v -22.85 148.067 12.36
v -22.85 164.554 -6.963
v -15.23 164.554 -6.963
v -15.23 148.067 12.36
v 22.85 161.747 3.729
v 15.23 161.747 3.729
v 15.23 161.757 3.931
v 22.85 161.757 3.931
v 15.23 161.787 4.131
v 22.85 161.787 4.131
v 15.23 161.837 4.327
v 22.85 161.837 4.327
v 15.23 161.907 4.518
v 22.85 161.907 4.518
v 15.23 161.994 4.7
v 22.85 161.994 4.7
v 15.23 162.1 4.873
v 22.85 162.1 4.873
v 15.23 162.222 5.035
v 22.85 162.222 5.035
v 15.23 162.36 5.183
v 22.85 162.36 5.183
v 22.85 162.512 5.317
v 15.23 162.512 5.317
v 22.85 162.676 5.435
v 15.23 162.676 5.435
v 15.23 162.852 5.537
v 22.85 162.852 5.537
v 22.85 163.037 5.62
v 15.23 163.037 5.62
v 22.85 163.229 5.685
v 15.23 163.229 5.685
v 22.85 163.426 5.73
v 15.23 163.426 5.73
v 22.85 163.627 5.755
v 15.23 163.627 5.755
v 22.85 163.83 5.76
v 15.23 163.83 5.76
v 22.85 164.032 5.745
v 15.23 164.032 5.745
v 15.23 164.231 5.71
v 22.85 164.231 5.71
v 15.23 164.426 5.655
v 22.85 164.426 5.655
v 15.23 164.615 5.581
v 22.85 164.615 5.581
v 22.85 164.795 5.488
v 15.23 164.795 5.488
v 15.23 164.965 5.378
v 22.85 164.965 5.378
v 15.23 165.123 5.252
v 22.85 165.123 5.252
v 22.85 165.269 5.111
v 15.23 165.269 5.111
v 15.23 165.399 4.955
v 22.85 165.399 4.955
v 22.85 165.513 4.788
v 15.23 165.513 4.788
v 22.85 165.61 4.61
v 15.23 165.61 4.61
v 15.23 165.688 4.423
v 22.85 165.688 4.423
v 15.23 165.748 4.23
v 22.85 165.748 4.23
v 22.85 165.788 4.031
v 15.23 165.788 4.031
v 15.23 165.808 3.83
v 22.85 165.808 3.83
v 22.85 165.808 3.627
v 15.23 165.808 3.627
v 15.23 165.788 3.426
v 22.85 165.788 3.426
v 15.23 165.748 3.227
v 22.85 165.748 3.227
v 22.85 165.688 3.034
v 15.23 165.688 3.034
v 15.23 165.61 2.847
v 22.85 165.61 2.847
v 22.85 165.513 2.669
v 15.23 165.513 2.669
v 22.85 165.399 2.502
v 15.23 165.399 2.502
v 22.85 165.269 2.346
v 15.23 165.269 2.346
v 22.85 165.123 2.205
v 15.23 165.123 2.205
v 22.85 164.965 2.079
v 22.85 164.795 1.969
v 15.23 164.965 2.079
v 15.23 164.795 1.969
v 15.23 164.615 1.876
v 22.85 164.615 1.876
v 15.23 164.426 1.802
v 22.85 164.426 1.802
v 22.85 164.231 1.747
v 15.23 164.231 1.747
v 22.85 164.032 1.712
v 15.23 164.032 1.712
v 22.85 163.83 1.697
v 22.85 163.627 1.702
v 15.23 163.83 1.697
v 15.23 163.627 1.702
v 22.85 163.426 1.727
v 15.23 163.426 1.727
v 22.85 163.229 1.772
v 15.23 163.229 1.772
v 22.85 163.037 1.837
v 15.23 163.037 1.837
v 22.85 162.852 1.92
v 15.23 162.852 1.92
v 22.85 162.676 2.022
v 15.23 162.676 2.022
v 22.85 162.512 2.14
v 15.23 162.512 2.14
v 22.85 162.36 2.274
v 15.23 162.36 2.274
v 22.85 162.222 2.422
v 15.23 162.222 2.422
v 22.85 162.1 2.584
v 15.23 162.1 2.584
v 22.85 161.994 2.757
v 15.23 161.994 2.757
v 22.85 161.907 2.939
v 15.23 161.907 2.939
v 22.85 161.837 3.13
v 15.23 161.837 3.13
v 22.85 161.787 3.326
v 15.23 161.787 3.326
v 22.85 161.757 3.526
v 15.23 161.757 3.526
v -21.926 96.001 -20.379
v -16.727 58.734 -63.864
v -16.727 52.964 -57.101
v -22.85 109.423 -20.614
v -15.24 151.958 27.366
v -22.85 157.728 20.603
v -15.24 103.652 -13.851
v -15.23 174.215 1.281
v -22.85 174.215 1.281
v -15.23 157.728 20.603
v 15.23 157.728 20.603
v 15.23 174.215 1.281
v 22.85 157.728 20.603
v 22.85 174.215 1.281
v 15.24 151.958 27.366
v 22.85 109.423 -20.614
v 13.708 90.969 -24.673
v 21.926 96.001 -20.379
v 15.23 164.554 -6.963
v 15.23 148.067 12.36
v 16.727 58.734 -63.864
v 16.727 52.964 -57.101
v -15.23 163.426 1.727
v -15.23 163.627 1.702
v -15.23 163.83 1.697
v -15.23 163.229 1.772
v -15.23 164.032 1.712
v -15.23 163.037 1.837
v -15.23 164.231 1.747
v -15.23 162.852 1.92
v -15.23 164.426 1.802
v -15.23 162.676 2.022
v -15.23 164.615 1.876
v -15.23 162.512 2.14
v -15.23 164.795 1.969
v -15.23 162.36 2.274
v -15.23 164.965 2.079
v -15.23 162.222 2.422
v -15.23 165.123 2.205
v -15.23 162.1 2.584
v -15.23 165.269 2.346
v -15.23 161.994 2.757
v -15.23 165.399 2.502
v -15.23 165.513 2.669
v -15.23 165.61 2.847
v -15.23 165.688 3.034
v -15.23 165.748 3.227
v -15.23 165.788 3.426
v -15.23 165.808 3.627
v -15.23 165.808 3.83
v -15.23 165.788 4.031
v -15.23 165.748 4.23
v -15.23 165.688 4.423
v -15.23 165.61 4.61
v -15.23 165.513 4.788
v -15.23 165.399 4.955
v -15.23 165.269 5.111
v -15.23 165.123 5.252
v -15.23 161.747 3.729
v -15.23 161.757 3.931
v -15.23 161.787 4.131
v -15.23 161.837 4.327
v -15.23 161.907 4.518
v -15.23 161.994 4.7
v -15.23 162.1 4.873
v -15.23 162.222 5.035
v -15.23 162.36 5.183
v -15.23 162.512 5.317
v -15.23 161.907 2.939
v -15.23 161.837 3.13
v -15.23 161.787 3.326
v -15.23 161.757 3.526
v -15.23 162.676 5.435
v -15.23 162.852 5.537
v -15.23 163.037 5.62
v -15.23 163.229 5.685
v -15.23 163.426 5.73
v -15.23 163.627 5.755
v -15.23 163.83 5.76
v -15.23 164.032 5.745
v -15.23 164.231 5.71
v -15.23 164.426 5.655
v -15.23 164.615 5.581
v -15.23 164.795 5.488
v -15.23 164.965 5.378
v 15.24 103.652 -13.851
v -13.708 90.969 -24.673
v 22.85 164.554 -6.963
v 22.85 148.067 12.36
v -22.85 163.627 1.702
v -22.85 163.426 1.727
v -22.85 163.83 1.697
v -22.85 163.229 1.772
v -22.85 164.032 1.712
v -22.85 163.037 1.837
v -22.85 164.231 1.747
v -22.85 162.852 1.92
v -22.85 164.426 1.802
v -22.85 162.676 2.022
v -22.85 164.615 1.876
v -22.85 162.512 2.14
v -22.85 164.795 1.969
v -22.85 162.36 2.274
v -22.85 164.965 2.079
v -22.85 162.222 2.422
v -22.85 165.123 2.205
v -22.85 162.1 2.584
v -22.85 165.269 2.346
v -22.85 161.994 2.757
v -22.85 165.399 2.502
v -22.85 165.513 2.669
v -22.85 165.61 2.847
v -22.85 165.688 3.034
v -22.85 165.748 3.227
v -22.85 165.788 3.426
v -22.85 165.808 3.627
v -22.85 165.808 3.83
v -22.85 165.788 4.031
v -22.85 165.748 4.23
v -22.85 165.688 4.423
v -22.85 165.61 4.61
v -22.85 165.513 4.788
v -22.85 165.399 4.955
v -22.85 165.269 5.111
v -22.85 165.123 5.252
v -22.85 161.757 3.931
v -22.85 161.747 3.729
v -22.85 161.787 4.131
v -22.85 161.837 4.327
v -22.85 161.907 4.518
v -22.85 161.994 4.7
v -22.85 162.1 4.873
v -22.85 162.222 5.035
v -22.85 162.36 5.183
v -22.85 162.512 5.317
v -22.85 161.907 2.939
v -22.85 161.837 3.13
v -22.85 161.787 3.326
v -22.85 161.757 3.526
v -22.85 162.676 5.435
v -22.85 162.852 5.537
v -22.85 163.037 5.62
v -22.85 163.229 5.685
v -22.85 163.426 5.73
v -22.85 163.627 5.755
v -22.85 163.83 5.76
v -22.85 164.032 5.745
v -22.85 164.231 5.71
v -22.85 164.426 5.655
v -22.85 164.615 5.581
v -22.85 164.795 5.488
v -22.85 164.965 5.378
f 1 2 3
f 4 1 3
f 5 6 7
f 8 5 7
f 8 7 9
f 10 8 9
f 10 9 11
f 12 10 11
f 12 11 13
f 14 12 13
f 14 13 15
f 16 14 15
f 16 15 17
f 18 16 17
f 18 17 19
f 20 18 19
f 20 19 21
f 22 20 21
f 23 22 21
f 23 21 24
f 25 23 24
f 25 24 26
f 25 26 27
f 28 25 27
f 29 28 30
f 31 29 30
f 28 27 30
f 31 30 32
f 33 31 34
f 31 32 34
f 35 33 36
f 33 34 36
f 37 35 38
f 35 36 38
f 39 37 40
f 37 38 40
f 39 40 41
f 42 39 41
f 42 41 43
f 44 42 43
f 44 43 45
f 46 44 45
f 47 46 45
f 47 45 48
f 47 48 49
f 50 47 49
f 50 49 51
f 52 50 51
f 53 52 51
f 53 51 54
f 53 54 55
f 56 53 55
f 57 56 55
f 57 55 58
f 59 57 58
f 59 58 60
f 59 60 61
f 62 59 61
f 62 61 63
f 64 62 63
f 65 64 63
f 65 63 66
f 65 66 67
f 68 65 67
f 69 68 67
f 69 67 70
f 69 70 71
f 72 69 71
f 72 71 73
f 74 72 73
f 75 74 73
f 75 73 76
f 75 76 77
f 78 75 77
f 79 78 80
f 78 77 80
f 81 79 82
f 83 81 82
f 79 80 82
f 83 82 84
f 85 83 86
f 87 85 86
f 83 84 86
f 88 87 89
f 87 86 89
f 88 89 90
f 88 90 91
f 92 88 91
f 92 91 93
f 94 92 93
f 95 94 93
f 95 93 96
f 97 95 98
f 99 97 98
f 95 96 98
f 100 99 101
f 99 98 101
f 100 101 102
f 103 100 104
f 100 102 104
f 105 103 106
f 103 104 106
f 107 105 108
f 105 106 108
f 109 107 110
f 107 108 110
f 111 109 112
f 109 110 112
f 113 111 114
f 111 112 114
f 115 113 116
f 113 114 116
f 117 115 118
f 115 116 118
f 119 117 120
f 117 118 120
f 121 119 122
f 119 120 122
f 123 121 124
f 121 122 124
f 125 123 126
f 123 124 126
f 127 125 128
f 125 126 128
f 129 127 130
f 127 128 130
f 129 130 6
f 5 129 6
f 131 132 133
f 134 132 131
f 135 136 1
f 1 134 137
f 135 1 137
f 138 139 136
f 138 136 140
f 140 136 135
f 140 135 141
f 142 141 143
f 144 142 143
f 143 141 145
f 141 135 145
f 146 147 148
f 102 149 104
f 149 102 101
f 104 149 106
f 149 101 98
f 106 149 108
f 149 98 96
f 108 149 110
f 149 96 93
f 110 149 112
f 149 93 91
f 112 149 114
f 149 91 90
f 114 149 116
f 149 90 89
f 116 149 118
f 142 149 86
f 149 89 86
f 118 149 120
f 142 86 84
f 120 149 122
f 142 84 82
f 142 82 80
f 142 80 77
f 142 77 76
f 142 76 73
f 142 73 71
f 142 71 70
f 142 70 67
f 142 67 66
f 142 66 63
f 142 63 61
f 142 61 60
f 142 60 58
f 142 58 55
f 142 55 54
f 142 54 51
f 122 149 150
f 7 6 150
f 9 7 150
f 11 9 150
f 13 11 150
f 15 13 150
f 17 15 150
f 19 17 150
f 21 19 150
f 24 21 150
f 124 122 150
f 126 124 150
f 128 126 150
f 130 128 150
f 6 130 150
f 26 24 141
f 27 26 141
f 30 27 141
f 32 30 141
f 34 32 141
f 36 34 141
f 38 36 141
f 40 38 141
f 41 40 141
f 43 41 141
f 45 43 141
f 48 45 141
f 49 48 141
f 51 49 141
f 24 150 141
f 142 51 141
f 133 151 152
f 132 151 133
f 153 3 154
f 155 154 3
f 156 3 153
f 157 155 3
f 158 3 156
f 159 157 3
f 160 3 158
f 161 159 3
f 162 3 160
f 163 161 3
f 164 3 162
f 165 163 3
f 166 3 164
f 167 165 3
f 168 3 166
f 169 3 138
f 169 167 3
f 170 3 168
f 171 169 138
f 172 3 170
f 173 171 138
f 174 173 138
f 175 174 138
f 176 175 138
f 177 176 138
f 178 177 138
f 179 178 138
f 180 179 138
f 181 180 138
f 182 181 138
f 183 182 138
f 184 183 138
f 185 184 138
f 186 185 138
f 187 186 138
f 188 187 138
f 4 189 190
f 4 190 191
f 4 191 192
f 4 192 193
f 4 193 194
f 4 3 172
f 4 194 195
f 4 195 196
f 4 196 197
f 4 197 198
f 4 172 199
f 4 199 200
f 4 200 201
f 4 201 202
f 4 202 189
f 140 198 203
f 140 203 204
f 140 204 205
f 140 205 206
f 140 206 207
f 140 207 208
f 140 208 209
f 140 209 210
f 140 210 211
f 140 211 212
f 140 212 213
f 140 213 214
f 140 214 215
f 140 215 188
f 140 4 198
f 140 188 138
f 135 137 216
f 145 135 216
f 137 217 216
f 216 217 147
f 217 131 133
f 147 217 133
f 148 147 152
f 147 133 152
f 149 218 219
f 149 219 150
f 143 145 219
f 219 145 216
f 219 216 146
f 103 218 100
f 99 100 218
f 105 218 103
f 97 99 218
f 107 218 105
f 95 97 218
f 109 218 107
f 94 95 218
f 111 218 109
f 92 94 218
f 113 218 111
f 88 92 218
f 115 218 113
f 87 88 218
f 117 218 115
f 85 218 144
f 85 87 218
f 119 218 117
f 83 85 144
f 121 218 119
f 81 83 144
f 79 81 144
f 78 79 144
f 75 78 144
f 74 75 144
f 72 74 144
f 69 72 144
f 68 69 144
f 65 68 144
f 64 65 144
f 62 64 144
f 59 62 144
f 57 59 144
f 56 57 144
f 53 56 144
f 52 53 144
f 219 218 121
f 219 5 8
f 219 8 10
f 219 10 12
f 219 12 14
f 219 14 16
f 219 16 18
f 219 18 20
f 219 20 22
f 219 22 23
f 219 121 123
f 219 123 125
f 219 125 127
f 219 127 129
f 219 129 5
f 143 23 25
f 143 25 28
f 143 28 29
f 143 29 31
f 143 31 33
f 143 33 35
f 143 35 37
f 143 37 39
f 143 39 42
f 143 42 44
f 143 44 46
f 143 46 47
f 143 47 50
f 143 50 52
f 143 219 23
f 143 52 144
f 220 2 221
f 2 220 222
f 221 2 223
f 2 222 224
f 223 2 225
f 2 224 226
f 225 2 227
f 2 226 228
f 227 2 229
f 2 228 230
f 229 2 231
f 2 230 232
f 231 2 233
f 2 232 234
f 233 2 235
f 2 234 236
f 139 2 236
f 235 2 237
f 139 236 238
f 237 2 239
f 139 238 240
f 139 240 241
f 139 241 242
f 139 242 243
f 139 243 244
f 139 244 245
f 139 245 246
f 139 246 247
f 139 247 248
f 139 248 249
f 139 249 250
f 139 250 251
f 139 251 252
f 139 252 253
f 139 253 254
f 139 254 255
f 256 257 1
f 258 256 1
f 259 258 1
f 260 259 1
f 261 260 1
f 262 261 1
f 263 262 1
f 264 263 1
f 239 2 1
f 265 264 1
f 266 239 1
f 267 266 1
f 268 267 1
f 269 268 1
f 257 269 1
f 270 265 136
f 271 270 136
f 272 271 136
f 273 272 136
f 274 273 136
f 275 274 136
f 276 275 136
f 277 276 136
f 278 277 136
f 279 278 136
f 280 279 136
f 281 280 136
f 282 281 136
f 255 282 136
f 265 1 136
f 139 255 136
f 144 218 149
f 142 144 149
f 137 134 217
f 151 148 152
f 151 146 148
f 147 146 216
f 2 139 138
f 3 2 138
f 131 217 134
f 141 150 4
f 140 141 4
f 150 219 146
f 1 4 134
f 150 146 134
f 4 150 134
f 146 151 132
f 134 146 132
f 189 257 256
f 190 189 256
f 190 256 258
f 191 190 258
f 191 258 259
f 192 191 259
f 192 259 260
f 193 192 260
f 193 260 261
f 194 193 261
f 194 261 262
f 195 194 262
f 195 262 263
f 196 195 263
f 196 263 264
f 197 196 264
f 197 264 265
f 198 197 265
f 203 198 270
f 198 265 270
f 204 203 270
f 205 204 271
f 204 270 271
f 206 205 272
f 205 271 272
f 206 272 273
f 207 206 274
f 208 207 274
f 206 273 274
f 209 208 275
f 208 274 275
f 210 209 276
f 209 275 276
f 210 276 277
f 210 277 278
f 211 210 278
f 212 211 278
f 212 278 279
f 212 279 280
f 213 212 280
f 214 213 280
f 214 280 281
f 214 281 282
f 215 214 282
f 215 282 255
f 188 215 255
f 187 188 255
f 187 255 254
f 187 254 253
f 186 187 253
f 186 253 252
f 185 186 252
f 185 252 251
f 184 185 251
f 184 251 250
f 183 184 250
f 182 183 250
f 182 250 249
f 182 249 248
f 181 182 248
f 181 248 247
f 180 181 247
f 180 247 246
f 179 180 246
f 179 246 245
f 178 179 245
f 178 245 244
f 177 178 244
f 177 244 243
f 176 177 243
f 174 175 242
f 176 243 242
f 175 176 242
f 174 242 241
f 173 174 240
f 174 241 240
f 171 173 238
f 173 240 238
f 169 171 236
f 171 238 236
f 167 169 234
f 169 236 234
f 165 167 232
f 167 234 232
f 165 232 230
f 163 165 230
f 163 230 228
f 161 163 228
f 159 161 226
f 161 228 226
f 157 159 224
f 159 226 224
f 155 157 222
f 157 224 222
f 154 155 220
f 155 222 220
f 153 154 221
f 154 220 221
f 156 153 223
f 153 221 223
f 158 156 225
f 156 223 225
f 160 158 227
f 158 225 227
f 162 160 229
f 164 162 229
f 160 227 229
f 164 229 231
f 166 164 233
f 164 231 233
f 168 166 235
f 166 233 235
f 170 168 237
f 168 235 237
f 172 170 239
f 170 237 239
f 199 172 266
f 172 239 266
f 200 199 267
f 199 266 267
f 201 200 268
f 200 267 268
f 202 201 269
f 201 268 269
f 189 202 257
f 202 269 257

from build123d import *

# Parameters (mm, degrees)
BOSS_EXTRUDE1_DEPTH = 8.89
SKETCH9_W           = 38.1
SKETCH9_H           = 121.867408042
CUT_EXTRUDE1_DEPTH  = 10.16
BOSS_EXTRUDE2_DEPTH = 63.5
SKETCH12_W          = 7.62
SKETCH12_H          = 12.7
BOSS_EXTRUDE3_DEPTH = 25.4
SKETCH13_R          = 2.031999992
CUT_EXTRUDE2_DEPTH  = 192.096705726


with BuildPart() as part:
    # Sketch2 → Boss-Extrude1 (new body)
    with BuildSketch(Plane(origin=(0, 56.279110665, -65.958580335), x_dir=(1, 0, 0), z_dir=(-2.6819765335530572e-15, -0.6490822674547435, 0.7607182198921023))):
        Polygon((-16.72668145, 3.22686704), (-22.849895735, 69.859735371), (22.849895735, 69.859735371), (16.72668145, 3.22686704), align=None)
    extrude(amount=BOSS_EXTRUDE1_DEPTH)

    # Sketch9 → Cut-Extrude1 (cut)
    with BuildSketch(Plane(origin=(33.190173949, 20.761268326, -19.633059225), x_dir=(0.48578044214566346, 0.04870063464806599, 0.8727231005385612), z_dir=(-0.757838639718343, -0.4740466672810366, 0.44828601739246093))):
        with Locations((-4.711274375, 41.231357985)):
            Rectangle(SKETCH9_W, SKETCH9_H)
    cut_extrude1 = extrude(amount=CUT_EXTRUDE1_DEPTH, mode=Mode.SUBTRACT)

    # Mirror1: Cut-Extrude1 across plane
    add(cut_extrude1.mirror(Plane.ZY), mode=Mode.SUBTRACT)

    # Sketch11 → Boss-Extrude2 (add)
    with BuildSketch(Plane(origin=(0, 53.143573534, 45.344715438), x_dir=(1, 0, 0), z_dir=(3.7947063652272325e-15, 0.7607182198921023, 0.6490822674547434))):
        Polygon((-22.849895735, 86.70566658), (-15.24, 77.81566658), (15.24, 77.81566658), (22.849895735, 86.70566658), align=None)
    extrude(amount=BOSS_EXTRUDE2_DEPTH)

    # Sketch12 → Boss-Extrude3 (add)
    with BuildSketch(Plane(origin=(0, 56.279110665, -65.958580335), x_dir=(-1, 0, 0), z_dir=(2.6000297763106772e-15, 0.6490822674547435, -0.7607182198921024))):
        with Locations((-19.039895735, 127.009735371)):
            Rectangle(SKETCH12_W, SKETCH12_H)
    boss_extrude3 = extrude(amount=BOSS_EXTRUDE3_DEPTH)

    # Mirror2: Boss-Extrude3 across plane
    add(boss_extrude3.mirror(Plane(origin=(0, 0, 0), x_dir=(0, 0, 1), z_dir=(1, 0, 0))))

    # Sketch13 → Cut-Extrude2 (cut, through all)
    with BuildSketch(Plane.ZY.offset(22.849895735)):
        with Locations(Location((3.72850645, 163.778945597, 0), (0, 0, 270))):
            Circle(SKETCH13_R)
    extrude(amount=-CUT_EXTRUDE2_DEPTH, mode=Mode.SUBTRACT)


solid = part.part
